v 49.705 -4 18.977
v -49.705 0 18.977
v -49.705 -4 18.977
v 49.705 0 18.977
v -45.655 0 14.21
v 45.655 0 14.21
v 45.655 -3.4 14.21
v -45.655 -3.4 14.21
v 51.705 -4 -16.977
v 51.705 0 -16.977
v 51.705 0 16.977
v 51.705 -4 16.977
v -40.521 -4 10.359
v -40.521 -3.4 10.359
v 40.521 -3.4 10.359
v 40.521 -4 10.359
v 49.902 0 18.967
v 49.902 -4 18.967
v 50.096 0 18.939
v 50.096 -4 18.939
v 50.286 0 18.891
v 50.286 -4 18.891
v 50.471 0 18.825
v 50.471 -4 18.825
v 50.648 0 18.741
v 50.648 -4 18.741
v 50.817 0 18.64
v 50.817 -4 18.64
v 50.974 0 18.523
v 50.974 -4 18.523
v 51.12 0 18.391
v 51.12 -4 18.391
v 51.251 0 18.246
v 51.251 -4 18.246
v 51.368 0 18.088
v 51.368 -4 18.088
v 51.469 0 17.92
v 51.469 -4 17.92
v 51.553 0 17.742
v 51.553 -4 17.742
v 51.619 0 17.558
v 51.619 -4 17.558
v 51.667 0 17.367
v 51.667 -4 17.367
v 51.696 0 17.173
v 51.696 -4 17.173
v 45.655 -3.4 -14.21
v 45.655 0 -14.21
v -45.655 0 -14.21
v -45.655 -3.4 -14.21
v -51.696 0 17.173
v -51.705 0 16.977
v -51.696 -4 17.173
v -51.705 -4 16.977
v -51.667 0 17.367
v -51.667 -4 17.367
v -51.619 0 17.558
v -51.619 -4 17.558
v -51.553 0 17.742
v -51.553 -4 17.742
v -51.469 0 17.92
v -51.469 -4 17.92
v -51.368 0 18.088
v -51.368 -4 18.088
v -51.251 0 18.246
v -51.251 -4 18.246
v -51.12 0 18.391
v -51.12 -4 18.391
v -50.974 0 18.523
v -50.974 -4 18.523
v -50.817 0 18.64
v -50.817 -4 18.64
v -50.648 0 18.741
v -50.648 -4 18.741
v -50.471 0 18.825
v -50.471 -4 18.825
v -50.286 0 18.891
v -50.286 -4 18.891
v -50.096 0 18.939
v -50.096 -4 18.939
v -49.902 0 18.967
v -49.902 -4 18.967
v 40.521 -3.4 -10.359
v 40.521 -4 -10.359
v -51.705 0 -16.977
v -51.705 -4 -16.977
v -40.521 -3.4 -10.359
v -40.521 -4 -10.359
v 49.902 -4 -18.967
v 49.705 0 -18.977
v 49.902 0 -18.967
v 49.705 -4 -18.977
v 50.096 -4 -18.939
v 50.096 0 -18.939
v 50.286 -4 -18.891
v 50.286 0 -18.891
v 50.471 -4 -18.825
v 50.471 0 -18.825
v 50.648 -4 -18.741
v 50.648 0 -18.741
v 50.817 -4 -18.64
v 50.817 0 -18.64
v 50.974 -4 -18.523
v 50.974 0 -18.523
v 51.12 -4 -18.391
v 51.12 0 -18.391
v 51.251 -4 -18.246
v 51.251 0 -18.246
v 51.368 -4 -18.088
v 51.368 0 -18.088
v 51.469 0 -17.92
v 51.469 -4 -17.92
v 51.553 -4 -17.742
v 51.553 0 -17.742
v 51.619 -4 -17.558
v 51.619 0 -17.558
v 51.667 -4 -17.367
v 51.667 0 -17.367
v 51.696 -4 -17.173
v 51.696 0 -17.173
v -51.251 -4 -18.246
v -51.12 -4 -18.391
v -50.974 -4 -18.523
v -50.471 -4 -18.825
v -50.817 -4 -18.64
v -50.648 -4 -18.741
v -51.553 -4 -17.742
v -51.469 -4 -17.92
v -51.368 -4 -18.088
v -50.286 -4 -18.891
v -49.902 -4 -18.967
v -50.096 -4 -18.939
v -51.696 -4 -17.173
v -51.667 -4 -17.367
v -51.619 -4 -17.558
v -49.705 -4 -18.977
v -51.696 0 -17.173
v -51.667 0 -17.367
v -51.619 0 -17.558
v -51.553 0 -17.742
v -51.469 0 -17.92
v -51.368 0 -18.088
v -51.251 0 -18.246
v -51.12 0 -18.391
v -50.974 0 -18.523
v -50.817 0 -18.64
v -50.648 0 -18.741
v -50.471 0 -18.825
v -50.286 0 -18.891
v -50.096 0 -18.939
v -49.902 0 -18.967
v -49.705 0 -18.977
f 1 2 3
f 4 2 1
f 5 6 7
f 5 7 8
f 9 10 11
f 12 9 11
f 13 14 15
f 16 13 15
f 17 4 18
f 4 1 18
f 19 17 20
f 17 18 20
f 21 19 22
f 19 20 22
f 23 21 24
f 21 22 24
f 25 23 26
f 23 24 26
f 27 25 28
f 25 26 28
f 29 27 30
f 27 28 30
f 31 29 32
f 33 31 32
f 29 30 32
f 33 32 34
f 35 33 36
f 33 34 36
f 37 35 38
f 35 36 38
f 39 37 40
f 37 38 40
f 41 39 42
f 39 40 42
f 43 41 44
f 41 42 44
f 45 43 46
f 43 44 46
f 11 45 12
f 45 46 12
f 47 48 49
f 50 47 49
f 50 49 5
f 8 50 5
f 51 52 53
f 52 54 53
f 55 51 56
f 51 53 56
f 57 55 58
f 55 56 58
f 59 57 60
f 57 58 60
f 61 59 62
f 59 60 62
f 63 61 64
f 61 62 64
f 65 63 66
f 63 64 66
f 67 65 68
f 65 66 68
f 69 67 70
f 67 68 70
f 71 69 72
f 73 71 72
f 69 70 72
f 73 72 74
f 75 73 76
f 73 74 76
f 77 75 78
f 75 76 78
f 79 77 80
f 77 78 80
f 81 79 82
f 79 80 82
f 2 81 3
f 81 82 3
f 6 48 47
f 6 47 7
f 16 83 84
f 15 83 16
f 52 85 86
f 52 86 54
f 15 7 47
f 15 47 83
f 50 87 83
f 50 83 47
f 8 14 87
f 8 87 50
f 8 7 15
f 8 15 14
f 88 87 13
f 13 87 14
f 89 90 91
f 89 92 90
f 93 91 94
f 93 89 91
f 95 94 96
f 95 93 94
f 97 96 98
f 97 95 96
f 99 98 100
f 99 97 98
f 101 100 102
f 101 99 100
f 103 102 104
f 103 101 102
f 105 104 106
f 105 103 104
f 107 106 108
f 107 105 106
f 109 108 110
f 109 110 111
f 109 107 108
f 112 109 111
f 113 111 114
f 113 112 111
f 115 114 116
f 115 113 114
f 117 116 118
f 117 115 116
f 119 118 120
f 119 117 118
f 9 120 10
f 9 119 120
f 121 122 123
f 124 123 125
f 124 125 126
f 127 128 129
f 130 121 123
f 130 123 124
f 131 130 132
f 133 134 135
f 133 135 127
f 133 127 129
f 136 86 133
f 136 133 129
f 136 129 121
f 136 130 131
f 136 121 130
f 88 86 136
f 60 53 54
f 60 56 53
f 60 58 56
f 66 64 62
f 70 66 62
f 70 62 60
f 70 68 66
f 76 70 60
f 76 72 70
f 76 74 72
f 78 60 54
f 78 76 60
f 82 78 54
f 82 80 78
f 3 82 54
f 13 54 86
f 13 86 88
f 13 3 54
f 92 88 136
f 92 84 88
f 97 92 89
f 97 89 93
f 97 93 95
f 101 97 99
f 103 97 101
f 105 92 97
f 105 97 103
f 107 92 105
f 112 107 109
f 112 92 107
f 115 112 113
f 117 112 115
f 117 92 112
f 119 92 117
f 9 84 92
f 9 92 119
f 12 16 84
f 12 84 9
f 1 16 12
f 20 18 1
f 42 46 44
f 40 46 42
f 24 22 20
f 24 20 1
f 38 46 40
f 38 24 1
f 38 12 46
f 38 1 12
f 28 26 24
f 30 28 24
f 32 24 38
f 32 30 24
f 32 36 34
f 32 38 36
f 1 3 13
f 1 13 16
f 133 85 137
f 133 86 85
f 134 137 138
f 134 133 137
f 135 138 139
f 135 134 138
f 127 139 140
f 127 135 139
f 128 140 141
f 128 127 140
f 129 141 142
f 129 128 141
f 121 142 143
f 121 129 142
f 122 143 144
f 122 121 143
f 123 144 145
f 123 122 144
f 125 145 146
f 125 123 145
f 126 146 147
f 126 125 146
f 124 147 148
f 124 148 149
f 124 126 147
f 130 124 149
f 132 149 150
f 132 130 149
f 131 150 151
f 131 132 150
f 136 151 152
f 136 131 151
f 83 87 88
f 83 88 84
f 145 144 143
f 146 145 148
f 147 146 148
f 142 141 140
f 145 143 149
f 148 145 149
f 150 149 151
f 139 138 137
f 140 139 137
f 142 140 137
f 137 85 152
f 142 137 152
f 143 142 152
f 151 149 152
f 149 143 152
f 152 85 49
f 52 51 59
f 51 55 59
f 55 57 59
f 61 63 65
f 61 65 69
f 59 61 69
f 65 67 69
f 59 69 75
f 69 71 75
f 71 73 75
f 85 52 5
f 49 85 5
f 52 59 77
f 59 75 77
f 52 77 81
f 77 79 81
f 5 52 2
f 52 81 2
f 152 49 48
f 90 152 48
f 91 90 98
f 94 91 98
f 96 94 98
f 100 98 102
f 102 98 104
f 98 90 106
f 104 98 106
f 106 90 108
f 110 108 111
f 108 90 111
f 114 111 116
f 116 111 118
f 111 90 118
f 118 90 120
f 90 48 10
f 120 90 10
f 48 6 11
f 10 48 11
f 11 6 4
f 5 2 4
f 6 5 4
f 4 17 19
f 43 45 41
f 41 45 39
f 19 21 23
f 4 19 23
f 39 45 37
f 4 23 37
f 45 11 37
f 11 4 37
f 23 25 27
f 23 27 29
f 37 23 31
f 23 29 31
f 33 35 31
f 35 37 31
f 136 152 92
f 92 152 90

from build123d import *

# Parameters (mm, degrees)
F0_W     = 103.410944
F0_H     = 37.954018
F0_W_2   = 81.041918
F0_H_2   = 20.718862
F1_DEPTH = 4
F2_W     = 91.309666
F2_H     = 28.419676
F2_W_2   = 81.041918
F2_H_2   = 20.718862
F3_DEPTH = 3.4
F4_R     = 2


with BuildPart() as f1:
    # F0 (on Front) → F1 (new body)
    with BuildSketch(Plane.XZ):
        Rectangle(F0_W, F0_H)
        Rectangle(F0_W_2, F0_H_2, mode=Mode.SUBTRACT)
    extrude(amount=F1_DEPTH)

    # F2 (on face) → F3 (cut)
    with BuildSketch(Plane(origin=(0, 0, 0), x_dir=(-1, 0, 0), z_dir=(0, 1, 0))):
        Rectangle(F2_W, F2_H)
        Rectangle(F2_W_2, F2_H_2, mode=Mode.SUBTRACT)
    extrude(amount=-F3_DEPTH, mode=Mode.SUBTRACT)

    # F4
    f4_edges = [f1.edges().sort_by_distance(p)[0] for p in [
        (-51.705472, -2, 18.977009),
        (51.705472, -2, 18.977009),
        (51.705472, -2, -18.977009),
        (-51.705472, -2, -18.977009),
    ]]
    fillet(f4_edges, radius=F4_R)


solid = f1.part
